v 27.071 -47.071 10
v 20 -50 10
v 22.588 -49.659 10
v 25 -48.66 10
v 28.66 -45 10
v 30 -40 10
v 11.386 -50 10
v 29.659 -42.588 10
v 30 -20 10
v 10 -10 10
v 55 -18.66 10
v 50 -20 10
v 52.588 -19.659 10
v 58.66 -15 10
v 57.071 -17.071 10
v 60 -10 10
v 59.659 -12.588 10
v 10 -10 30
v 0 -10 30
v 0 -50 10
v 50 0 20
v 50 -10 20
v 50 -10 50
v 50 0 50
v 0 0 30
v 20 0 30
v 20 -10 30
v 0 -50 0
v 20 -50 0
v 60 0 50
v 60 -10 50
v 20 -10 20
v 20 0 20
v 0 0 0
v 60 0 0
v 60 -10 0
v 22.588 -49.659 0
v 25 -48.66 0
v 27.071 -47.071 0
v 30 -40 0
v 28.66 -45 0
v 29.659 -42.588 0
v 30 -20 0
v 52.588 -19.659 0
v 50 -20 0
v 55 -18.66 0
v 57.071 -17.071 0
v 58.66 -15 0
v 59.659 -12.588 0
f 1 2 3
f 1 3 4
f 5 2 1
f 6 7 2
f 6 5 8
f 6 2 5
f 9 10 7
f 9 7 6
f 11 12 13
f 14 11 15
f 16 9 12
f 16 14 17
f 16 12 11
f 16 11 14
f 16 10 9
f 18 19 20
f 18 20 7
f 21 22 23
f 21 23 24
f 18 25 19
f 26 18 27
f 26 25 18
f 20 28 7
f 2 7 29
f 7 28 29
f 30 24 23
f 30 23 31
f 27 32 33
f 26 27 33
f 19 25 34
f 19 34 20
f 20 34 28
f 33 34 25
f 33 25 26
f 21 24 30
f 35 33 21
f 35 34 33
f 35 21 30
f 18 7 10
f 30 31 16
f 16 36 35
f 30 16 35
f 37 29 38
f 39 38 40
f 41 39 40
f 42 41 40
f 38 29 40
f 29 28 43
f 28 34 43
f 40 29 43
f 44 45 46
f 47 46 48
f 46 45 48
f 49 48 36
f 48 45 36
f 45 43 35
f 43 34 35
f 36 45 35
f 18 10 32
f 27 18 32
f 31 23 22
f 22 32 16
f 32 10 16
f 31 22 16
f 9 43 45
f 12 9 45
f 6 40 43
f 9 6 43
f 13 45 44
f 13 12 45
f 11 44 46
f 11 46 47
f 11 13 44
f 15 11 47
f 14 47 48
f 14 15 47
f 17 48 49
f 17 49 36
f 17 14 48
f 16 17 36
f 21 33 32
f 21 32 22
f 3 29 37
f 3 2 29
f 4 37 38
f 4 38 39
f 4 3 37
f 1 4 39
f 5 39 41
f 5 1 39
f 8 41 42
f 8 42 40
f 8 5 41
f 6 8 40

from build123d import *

# Parameters (mm, degrees)
F1_DEPTH  = 10
F2_R      = 10
F3_W      = 10
F3_H      = 10
F4_DEPTH  = 40
F5_W      = 30
F5_H      = 10
F6_DEPTH  = 10
F7_W      = 20
F7_H      = 10
F8_DEPTH  = 20
F10_DEPTH = 20
F11_SIZE2 = 40
F11_SIZE  = 20


with BuildPart() as f1:
    # F0 (on Top) → F1 (new body)
    with BuildSketch(Plane.XY):
        Polygon((60, 0), (0, 0), (0, -50), (30, -50), (30, -20), (60, -20), align=None)
    extrude(amount=F1_DEPTH)

    # F2
    f2_edges = [f1.edges().sort_by_distance(p)[0] for p in [
        (30, -50, 5),
        (60, -20, 5),
    ]]
    fillet(f2_edges, radius=F2_R)

    # F3 (on face) → F4 (join)
    with BuildSketch(Plane.XY.offset(10)):
        with Locations((55, -5)):
            Rectangle(F3_W, F3_H)
    extrude(amount=F4_DEPTH)

    # F5 (on face) → F6 (join)
    with BuildSketch(Plane.XY.offset(10)):
        with Locations((35, -5)):
            Rectangle(F5_W, F5_H)
    extrude(amount=F6_DEPTH)

    # F7 (on face) → F8 (join)
    with BuildSketch(Plane.XY.offset(10)):
        with Locations((10, -5)):
            Rectangle(F7_W, F7_H)
    extrude(amount=F8_DEPTH)

    # F9 (on face) → F10 (join)
    with BuildSketch(Plane.XY.offset(10)):
        Polygon((10, -10), (0, -10), (0, -50), (11.3857937977, -50), align=None)
    extrude(amount=F10_DEPTH)

    # F11
    f11_edges = [f1.edges().sort_by_distance(p)[0] for p in [
        (5.692897, -50, 30),
    ]]
    f11_side = f1.faces().sort_by_distance((7.706899, -50, 12.985998))[0]
    chamfer(f11_edges, length=F11_SIZE, length2=F11_SIZE2, reference=f11_side)


solid = f1.part
